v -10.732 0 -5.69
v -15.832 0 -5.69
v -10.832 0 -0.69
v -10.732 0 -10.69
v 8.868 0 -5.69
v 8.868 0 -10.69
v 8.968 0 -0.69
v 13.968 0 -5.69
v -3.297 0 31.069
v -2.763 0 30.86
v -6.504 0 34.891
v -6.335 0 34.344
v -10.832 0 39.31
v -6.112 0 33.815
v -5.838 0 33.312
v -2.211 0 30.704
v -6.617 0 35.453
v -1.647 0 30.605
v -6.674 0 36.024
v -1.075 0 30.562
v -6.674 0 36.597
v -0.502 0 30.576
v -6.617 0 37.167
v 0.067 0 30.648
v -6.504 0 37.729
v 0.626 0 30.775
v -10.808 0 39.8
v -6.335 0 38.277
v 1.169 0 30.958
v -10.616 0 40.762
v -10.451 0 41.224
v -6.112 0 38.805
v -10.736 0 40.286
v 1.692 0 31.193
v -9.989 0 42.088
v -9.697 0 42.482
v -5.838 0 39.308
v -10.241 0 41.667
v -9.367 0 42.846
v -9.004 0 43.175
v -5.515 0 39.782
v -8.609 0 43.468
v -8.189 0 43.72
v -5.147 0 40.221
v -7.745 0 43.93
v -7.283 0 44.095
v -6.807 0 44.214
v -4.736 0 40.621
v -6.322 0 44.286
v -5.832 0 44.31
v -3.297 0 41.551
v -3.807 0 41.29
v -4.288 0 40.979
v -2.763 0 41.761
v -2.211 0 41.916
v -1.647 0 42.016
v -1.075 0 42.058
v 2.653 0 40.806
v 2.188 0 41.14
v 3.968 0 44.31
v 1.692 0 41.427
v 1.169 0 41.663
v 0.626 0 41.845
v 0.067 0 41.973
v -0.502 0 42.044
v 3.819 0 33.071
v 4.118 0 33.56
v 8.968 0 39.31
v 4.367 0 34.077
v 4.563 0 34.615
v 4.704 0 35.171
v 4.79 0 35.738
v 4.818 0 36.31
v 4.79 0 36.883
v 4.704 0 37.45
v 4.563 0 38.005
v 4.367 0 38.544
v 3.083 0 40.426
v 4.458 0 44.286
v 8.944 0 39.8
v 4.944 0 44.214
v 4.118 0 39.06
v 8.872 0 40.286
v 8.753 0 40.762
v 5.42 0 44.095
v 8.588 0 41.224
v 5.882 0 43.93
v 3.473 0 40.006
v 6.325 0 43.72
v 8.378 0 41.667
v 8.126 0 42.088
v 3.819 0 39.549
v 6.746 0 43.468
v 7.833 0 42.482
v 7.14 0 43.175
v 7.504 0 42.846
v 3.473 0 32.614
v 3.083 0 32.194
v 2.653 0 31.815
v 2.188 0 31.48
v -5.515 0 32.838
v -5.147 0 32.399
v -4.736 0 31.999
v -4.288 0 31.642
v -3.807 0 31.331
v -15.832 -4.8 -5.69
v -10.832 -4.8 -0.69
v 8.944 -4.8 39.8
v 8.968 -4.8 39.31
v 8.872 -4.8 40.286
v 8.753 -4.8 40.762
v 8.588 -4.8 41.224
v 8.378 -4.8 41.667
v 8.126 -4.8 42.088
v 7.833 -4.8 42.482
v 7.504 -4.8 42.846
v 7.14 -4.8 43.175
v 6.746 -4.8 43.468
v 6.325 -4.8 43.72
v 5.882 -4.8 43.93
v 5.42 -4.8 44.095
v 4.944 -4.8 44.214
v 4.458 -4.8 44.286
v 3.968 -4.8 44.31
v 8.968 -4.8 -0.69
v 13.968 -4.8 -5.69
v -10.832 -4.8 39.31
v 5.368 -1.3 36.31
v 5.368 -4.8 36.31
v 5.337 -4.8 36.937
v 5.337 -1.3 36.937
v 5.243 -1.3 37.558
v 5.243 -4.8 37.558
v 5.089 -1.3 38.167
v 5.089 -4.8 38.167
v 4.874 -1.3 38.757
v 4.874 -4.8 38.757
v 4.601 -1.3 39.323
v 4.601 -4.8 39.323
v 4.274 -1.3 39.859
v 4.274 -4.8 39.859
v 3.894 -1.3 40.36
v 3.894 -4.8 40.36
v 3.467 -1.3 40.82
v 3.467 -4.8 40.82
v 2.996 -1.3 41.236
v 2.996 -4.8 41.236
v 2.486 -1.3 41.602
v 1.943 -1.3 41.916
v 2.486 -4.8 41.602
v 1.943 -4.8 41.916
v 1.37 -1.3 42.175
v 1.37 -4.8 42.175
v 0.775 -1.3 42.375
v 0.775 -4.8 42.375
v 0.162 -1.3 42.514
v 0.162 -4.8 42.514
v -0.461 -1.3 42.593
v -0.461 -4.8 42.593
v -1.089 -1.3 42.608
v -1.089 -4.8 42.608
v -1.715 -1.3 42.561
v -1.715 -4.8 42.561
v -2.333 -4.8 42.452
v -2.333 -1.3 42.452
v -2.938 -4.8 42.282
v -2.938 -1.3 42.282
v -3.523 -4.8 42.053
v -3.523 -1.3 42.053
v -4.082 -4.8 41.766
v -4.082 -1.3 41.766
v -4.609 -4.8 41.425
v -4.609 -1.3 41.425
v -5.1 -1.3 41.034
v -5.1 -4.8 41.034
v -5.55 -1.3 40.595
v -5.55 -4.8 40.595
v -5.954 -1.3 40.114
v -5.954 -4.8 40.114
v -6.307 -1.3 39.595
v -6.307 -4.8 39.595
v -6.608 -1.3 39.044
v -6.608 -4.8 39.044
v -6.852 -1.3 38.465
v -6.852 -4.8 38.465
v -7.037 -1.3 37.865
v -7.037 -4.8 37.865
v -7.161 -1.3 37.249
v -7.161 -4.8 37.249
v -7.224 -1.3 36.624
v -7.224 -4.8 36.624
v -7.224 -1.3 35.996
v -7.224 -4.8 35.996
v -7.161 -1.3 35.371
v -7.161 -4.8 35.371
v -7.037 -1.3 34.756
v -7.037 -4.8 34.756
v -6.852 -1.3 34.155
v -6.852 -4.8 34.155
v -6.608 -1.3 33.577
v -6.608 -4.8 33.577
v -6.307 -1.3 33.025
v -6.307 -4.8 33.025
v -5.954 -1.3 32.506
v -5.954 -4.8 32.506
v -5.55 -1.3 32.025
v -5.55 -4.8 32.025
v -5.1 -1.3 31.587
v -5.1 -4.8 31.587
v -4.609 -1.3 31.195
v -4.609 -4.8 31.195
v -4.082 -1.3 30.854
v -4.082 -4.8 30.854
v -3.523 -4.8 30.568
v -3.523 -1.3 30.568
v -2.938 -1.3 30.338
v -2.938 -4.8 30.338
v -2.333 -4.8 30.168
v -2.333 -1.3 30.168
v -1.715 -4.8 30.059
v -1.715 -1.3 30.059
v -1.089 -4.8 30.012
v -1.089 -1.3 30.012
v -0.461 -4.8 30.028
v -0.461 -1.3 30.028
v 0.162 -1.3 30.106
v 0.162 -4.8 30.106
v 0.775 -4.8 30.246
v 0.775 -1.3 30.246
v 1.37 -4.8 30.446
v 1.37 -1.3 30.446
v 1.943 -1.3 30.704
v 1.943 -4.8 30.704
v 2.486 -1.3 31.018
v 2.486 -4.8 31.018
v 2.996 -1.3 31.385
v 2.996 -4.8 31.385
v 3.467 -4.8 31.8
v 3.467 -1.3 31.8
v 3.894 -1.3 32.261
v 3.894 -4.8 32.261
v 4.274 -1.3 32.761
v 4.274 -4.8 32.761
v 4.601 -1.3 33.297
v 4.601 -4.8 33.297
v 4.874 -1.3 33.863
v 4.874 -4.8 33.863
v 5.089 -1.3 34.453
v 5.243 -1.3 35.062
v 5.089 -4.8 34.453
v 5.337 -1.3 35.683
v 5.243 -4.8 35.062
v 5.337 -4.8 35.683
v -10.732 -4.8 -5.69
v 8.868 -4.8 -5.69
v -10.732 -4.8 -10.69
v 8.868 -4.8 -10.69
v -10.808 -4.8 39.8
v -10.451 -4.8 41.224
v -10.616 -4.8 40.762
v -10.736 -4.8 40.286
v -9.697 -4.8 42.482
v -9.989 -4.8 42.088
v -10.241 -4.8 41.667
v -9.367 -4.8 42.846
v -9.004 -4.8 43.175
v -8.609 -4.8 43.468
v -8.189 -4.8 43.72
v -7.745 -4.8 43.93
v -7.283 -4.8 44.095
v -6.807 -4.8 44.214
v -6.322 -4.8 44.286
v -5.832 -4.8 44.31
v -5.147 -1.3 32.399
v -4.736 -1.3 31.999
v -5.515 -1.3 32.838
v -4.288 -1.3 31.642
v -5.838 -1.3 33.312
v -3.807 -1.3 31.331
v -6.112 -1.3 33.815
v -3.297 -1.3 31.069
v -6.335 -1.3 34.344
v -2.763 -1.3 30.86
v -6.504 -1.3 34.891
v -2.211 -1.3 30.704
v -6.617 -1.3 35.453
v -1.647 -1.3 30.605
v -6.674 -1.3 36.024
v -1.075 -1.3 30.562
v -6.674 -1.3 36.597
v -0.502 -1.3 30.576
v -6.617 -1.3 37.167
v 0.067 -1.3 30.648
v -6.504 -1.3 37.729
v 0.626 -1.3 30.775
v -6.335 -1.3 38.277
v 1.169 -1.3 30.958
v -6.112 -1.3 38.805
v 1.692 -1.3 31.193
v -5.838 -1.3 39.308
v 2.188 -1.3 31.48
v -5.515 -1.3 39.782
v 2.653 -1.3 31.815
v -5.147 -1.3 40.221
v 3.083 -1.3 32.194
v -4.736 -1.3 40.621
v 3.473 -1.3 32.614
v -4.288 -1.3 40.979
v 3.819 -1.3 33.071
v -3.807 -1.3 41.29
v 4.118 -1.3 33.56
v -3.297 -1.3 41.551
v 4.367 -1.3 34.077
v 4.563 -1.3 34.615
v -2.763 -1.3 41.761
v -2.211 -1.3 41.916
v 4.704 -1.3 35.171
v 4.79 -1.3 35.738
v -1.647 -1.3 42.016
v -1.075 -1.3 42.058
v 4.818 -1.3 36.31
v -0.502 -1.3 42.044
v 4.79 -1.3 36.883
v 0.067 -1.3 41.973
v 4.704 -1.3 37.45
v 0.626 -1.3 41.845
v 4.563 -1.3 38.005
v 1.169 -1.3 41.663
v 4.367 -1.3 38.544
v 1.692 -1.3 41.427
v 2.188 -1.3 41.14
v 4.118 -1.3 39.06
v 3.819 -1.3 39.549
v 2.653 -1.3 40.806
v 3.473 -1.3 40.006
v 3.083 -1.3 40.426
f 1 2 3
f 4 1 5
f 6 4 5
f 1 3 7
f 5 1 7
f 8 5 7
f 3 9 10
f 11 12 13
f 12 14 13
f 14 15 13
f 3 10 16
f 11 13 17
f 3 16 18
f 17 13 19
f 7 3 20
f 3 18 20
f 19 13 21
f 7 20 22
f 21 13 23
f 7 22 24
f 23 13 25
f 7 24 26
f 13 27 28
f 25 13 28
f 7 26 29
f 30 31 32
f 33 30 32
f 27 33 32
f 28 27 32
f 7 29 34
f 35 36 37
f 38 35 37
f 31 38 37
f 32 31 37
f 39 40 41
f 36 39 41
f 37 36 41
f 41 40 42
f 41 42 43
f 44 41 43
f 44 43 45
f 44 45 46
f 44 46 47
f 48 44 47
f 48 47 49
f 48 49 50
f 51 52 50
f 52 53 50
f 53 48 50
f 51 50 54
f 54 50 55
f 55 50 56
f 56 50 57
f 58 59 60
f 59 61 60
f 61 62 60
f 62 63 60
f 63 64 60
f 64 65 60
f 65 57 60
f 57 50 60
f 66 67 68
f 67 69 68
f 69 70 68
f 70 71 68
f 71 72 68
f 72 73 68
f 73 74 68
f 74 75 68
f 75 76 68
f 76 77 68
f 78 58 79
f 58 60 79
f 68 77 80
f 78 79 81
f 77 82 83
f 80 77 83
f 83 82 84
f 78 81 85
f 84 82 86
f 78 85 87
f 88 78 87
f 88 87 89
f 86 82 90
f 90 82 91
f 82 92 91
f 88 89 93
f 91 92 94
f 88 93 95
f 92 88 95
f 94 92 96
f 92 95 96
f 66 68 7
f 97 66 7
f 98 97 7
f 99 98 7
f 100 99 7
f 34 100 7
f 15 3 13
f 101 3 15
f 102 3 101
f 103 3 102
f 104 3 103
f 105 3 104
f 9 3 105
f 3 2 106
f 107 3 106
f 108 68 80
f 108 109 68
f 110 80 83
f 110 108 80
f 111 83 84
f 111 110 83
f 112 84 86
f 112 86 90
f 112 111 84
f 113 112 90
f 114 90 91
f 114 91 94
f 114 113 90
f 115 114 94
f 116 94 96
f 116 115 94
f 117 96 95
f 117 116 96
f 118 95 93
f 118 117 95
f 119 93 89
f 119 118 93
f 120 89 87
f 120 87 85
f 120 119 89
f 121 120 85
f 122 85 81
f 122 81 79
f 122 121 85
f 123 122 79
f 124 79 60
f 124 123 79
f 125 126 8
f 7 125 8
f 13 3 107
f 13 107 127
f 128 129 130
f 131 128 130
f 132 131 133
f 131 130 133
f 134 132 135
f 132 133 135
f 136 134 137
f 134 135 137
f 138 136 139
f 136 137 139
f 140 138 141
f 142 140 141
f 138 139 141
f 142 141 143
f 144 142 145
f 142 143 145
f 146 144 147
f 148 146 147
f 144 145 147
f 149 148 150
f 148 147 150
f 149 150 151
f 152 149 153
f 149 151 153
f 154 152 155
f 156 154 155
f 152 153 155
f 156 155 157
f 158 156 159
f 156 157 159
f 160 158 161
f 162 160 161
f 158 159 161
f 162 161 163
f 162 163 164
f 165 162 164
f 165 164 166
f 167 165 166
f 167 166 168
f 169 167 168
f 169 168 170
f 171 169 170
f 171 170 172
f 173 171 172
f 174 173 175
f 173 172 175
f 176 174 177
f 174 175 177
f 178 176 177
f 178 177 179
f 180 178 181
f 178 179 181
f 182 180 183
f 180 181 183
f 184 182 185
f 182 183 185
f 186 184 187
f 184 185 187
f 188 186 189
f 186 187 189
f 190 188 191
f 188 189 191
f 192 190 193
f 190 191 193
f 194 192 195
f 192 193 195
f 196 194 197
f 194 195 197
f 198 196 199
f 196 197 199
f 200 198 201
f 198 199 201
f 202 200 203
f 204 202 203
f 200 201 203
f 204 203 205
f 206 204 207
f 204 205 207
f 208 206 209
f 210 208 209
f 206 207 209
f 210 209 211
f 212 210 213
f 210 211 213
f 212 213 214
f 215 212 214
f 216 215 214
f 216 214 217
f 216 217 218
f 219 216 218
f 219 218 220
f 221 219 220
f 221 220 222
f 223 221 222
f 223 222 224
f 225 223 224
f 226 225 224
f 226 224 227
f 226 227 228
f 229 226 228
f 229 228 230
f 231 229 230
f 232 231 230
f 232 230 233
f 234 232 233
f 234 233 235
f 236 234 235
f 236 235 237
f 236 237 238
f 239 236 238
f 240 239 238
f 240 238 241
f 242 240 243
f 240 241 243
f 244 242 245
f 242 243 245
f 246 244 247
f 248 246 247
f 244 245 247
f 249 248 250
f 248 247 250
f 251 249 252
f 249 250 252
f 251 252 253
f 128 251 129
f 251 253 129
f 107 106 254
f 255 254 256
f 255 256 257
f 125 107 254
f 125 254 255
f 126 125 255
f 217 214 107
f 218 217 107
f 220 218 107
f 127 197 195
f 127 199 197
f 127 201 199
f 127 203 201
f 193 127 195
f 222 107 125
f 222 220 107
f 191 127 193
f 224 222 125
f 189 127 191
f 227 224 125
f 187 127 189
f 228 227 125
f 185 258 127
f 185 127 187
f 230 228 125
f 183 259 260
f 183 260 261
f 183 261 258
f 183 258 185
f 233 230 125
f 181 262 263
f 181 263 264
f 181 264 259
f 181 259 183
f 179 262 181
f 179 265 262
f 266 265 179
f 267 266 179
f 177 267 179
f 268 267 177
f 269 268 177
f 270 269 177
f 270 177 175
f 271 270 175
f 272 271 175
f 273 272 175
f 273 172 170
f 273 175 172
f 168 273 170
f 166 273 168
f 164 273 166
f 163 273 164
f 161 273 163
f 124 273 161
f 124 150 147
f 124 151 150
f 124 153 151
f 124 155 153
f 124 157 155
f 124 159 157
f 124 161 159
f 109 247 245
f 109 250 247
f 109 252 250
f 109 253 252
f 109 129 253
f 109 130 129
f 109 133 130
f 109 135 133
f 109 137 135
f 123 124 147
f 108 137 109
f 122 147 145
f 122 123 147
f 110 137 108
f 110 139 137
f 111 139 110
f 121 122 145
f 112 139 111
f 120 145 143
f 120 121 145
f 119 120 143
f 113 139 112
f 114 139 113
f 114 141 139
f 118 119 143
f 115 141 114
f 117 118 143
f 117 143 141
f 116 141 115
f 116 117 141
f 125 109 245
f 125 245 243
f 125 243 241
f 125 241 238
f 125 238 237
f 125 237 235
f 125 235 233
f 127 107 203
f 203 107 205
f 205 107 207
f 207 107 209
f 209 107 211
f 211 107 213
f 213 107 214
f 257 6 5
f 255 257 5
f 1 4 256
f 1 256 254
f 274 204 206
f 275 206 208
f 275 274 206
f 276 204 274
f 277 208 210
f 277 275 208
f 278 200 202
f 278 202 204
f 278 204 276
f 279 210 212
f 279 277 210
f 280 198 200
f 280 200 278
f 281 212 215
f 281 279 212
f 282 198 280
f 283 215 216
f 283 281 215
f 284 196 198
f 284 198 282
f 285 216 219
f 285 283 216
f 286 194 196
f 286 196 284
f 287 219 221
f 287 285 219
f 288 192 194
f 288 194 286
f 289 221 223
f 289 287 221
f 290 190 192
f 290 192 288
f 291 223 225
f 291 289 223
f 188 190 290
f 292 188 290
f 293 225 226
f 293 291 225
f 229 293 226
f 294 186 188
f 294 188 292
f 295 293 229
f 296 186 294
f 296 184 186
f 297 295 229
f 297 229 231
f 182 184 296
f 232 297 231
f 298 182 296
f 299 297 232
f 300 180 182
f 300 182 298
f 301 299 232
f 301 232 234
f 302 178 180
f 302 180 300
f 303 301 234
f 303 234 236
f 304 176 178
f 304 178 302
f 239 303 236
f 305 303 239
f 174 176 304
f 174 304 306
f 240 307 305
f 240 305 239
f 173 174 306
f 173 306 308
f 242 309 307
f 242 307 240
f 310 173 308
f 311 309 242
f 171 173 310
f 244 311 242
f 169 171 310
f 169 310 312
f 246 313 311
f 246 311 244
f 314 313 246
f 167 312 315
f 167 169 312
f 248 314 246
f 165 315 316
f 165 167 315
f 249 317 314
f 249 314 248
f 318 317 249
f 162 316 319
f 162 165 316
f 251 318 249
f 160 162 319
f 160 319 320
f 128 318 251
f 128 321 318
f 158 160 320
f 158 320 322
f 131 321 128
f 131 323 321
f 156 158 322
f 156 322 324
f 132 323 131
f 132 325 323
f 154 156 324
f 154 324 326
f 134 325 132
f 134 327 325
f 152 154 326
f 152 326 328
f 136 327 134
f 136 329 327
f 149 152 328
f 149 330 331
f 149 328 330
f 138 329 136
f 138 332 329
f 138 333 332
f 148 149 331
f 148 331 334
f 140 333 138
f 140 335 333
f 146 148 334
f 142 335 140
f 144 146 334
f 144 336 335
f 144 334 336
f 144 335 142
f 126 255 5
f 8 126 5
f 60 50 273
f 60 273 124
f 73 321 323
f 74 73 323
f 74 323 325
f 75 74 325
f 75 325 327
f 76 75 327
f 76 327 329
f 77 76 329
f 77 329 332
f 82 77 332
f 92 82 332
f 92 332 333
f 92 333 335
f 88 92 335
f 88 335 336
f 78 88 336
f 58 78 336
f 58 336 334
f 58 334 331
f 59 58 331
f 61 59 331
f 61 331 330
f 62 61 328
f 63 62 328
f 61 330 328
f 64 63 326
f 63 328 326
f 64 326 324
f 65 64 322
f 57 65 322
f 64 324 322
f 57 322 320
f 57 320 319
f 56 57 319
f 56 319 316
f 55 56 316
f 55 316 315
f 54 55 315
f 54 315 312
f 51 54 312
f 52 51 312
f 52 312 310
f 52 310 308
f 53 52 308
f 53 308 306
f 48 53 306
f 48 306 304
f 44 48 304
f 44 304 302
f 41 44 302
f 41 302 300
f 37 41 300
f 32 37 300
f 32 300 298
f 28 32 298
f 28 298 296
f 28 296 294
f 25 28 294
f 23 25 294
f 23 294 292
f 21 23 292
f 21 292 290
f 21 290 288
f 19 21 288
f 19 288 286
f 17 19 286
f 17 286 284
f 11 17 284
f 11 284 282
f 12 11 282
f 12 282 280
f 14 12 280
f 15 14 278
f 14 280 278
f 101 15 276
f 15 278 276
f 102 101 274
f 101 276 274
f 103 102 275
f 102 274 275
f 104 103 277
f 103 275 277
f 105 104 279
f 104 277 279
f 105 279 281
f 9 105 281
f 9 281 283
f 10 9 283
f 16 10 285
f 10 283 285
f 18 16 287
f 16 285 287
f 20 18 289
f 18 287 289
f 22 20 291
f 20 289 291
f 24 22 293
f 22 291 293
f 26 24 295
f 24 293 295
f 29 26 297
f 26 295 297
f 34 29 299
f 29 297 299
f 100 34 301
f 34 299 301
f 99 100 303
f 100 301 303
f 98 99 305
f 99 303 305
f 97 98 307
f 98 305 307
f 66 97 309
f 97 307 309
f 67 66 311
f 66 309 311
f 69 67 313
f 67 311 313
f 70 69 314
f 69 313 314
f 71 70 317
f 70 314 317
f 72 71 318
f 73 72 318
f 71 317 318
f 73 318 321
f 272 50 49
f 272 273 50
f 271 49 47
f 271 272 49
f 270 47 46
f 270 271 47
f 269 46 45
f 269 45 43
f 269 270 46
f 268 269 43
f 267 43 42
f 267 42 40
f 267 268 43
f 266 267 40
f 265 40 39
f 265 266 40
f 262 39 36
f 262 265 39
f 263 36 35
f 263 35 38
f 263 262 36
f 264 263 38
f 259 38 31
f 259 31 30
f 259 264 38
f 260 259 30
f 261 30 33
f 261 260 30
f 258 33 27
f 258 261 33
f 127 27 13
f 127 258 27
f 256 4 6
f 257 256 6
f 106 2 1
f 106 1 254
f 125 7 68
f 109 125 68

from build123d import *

# Parameters (mm, degrees)
F0_W      = 19.8
F0_H      = 55
F1_DEPTH  = 4.8
F2_R      = 5.75
F3_DEPTH  = 4.8
F4_R      = 6.3
F5_DEPTH  = 3.5
F6_W      = 4.8
F6_H      = 5
F7_DEPTH  = 5
F8_SIZE   = 4.99999
F9_W      = 4.8
F9_H      = 5
F10_DEPTH = 5
F11_SIZE  = 4.99999
F12_R     = 5
F13_DEPTH = 0.1
F14_DEPTH = 0.1


# Not quite as in the source:
# - a fillet or chamfer is up to 0.001 mm smaller than in the source, because OpenCascade refuses the exact size


with BuildPart() as f1:
    # F0 (on Front) → F1 (new body)
    with BuildSketch(Plane.XZ):
        with Locations((-0.9316042997, 16.8101646874)):
            Rectangle(F0_W, F0_H)
    extrude(amount=F1_DEPTH)

    # F2 (on face) → F3 (cut, through all)
    with BuildSketch(Plane.XZ.offset(4.8)):
        with Locations((-0.9316042997, 36.3101646874)):
            Circle(F2_R)
    extrude(amount=-F3_DEPTH, mode=Mode.SUBTRACT)

    # F4 (on face) → F5 (cut)
    with BuildSketch(Plane.XZ.offset(4.8)):
        with Locations((-0.9316042997, 36.3101646874)):
            Circle(F4_R)
    extrude(amount=-F5_DEPTH, mode=Mode.SUBTRACT)

    # F6 (on face) → F7 (join)
    with BuildSketch(Plane(origin=(-10.8316042997, 0, 0), x_dir=(0, -1, 0), z_dir=(-1, 0, 0))):
        with Locations((2.4, -3.1898353126)):
            Rectangle(F6_W, F6_H)
    extrude(amount=F7_DEPTH)

    # F8 (size 5 in the source; OpenCascade refuses exactly that, so slightly less here)
    f8_edges = [f1.edges().sort_by_distance(p)[0] for p in [
        (-15.831604, -2.4, -0.689835),
    ]]
    chamfer(f8_edges, length=F8_SIZE)

    # F9 (on face) → F10 (join)
    with BuildSketch(Plane.YZ.offset(8.9683957003)):
        with Locations((-2.4, -3.1898353126)):
            Rectangle(F9_W, F9_H)
    extrude(amount=F10_DEPTH)

    # F11 (size 5 in the source; OpenCascade refuses exactly that, so slightly less here)
    f11_edges = [f1.edges().sort_by_distance(p)[0] for p in [
        (13.968396, -2.4, -0.689835),
    ]]
    chamfer(f11_edges, length=F11_SIZE)

    # F12
    f12_edges = [f1.edges().sort_by_distance(p)[0] for p in [
        (-10.831604, -2.4, 44.310165),
        (8.968396, -2.4, 44.310165),
    ]]
    fillet(f12_edges, radius=F12_R)

    # F13 (cut): a face of the model
    f13_faces = [f1.faces().sort_by_distance(p)[0] for p in [
        (-10.8316042997, -2.4, -8.1898353126),
    ]]
    extrude(f13_faces, amount=-F13_DEPTH, mode=Mode.SUBTRACT)

    # F14 (cut): a face of the model
    f14_faces = [f1.faces().sort_by_distance(p)[0] for p in [
        (8.9683957003, -2.4, -8.1898353126),
    ]]
    extrude(f14_faces, amount=-F14_DEPTH, mode=Mode.SUBTRACT)


solid = f1.part
